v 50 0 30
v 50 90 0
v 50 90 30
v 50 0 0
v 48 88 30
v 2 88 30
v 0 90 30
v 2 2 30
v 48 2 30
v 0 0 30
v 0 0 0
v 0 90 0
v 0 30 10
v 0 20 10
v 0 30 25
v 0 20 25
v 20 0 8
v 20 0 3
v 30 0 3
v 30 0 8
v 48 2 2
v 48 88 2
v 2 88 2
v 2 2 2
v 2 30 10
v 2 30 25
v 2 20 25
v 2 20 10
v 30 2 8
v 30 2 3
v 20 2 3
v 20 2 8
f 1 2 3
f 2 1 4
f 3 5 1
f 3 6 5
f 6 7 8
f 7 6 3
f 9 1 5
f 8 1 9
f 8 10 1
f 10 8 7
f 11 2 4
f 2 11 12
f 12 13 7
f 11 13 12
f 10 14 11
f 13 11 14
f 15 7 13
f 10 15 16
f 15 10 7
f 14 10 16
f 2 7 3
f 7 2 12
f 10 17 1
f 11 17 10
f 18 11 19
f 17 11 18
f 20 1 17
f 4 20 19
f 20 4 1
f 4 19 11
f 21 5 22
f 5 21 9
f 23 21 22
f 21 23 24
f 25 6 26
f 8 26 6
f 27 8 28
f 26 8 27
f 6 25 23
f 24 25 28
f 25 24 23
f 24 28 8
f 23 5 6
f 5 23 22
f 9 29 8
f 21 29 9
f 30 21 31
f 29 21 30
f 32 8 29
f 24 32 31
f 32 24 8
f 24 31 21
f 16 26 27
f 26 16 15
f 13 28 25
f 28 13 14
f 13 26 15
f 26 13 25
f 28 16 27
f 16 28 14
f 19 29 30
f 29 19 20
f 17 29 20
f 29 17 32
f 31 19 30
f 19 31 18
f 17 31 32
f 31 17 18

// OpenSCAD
// Parametryczna Obudowa 3D
// Miejsce na ESP32, ogniwo 18650 i moduł TP4056

wall = 2;
x_width = 50;
y_length = 90;
z_height = 30;

module case_body() {
    difference() {
        // Główna bryła
        cube([x_width, y_length, z_height]);
        
        // Wnętrze (wydrążenie)
        translate([wall, wall, wall])
            cube([x_width - 2*wall, y_length - 2*wall, z_height]);
            
        // Otwór na przełącznik (10x15mm kołyskowy) na bocznej ściance
        translate([-1, 20, 10])
            cube([5, 10, 15]);
            
        // Otwór na port USB z TP4056
        translate([x_width/2 - 5, -1, 3])
            cube([10, 5, 5]);
            
        // Otwór na OV2640 i kopułkę PIR
translate([x_width/2, 10, z_height-2]) cylinder(h=5, r=4.5, $fn=50);
translate([x_width/2, 35, z_height-2]) cylinder(h=5, r=12, $fn=50);
    }
}

case_body();
